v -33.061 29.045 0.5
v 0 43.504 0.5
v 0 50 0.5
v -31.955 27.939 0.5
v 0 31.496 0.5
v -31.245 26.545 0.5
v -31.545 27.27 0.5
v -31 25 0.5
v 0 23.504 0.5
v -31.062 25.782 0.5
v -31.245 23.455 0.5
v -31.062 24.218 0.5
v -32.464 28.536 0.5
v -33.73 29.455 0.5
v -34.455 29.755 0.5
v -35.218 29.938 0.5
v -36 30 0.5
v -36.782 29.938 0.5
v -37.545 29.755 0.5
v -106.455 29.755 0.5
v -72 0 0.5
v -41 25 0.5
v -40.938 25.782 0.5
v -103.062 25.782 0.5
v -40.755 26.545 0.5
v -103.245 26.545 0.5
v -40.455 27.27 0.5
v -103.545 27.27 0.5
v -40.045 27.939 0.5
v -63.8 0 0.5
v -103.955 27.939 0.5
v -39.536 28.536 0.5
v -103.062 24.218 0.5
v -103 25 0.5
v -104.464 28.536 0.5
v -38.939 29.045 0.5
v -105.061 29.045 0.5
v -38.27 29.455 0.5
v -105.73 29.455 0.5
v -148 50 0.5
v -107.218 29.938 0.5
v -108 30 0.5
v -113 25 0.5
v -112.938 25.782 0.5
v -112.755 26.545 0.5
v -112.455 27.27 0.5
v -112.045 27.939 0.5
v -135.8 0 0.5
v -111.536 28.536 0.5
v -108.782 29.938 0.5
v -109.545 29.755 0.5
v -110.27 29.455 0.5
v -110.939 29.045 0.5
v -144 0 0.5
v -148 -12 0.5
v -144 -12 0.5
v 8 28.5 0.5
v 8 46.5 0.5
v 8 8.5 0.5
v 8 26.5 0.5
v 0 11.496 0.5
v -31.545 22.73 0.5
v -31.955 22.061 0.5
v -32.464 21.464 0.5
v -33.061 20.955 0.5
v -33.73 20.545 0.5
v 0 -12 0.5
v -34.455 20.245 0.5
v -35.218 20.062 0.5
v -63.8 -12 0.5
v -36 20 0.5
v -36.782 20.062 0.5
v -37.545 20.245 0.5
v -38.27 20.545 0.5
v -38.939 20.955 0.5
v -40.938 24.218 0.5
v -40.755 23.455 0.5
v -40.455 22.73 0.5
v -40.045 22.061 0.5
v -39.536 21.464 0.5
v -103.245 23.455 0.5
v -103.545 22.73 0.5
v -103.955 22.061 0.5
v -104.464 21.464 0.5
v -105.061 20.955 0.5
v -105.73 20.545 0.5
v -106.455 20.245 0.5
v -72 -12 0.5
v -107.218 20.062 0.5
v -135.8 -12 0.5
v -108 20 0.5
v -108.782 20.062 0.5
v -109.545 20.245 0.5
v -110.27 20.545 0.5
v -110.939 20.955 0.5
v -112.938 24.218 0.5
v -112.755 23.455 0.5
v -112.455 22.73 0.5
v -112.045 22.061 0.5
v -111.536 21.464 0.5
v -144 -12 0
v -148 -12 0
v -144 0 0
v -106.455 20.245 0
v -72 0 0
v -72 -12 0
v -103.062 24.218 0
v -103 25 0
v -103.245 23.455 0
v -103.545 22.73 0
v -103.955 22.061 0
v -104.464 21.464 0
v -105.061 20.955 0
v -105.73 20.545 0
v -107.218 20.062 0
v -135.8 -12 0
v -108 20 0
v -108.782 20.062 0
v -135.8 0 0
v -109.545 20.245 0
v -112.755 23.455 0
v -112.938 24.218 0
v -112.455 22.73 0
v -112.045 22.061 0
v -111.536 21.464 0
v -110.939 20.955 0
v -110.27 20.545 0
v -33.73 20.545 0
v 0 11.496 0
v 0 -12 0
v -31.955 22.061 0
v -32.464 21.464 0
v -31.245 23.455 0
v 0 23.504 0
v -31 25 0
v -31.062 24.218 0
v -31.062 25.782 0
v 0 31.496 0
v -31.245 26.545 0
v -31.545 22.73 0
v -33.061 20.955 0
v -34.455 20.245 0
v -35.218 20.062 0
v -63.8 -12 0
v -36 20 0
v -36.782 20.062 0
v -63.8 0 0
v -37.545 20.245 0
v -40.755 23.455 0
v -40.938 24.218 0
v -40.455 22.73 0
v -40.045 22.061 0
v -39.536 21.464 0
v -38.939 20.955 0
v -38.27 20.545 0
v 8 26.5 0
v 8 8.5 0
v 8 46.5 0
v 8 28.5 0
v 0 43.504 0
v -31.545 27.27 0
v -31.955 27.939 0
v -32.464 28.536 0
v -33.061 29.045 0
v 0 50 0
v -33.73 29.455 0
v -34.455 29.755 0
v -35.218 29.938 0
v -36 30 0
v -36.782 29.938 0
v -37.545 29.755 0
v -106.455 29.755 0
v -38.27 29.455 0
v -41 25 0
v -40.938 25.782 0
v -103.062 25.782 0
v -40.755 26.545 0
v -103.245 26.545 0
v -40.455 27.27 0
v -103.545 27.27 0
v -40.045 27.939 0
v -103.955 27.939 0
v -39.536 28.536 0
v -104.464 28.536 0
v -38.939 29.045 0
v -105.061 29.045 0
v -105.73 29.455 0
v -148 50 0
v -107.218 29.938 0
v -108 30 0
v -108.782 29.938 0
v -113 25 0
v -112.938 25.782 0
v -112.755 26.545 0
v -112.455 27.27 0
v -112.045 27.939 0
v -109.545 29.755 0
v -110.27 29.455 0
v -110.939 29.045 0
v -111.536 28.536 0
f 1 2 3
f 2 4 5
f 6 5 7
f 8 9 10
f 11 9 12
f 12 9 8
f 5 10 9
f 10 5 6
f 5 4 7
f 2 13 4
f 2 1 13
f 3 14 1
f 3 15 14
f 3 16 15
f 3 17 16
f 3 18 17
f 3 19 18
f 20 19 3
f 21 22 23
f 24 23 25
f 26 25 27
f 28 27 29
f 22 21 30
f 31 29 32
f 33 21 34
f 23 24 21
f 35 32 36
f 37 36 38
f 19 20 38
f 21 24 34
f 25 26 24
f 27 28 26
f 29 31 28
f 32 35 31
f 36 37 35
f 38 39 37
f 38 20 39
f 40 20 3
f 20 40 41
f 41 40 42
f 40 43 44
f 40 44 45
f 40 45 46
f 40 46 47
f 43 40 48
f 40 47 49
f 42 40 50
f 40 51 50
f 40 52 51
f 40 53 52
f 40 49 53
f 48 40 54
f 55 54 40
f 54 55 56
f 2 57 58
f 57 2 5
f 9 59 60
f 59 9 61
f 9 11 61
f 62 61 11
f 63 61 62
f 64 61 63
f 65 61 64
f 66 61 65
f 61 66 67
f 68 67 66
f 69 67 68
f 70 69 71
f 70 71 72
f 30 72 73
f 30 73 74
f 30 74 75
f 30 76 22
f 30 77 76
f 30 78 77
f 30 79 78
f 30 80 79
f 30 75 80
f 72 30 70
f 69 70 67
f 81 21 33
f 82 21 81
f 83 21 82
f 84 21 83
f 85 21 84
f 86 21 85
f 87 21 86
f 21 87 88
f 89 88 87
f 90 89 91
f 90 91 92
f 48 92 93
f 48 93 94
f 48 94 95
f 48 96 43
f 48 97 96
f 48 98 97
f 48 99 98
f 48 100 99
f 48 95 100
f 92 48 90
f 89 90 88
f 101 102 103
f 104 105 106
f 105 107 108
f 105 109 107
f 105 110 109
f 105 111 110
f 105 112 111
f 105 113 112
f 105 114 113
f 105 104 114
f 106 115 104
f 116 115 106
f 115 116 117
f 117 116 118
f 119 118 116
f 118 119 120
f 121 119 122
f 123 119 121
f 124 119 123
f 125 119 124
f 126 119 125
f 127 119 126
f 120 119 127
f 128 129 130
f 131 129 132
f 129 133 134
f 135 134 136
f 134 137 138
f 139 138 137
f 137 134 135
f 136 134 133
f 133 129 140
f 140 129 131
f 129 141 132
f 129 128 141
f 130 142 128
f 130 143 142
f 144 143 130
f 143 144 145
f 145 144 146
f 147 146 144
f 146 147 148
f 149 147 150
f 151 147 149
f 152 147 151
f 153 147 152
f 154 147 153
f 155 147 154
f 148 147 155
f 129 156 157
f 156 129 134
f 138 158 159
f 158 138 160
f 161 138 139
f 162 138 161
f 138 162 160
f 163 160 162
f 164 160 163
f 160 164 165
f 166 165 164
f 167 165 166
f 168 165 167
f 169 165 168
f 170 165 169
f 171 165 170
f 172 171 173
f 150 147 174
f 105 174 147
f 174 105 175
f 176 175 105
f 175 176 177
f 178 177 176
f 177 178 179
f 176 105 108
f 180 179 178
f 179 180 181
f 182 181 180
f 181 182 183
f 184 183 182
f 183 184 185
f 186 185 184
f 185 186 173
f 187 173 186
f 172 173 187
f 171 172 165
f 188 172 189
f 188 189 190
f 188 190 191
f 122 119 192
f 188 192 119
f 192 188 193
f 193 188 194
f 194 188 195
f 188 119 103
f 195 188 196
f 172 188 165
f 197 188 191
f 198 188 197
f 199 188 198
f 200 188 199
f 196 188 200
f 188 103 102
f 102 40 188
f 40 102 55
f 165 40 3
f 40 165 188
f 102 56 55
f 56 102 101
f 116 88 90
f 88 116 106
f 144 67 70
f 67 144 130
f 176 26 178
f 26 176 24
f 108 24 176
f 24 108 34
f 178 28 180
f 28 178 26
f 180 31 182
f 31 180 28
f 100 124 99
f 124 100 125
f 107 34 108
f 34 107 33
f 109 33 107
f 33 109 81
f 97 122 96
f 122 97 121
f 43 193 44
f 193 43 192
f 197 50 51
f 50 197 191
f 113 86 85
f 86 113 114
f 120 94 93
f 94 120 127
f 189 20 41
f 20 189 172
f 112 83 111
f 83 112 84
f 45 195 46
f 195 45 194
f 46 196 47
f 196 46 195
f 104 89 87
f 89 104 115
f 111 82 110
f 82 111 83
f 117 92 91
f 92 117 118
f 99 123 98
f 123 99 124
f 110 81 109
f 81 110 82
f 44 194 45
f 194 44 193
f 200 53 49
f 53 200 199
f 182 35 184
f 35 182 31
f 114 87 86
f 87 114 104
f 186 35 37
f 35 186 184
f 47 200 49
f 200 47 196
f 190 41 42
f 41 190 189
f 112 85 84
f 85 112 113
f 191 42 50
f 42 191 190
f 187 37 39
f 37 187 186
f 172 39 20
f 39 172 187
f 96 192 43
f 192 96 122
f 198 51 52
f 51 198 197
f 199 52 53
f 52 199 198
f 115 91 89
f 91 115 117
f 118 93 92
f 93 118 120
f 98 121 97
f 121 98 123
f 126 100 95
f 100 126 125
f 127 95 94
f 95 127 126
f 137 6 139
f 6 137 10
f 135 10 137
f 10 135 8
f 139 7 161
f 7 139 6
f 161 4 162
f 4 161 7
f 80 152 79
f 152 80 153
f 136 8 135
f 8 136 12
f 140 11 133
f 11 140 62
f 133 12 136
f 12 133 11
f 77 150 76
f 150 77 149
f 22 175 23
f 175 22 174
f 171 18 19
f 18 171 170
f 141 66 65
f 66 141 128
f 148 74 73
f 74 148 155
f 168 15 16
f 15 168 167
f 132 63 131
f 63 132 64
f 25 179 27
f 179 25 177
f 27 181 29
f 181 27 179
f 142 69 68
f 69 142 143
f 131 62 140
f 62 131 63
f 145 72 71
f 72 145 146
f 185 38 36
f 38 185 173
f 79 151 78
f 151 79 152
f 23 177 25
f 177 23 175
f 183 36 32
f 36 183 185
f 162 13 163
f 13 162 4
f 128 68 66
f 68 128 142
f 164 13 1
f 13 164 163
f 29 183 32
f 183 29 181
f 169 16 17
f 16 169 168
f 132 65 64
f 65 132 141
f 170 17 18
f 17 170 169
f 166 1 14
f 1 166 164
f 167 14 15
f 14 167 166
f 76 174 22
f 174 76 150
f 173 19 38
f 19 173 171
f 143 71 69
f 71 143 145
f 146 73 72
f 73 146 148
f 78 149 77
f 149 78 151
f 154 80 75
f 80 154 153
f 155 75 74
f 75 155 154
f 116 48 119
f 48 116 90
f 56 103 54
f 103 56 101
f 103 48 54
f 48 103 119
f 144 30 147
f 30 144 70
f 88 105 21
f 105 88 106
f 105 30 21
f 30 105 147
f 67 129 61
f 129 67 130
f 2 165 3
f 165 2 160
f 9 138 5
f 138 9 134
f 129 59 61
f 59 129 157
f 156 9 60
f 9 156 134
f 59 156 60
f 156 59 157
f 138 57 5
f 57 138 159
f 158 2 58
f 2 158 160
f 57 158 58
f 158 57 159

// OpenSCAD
include <../lib/filament-spool-roller-lib.scad>;
$fn = 40;
template_left();
